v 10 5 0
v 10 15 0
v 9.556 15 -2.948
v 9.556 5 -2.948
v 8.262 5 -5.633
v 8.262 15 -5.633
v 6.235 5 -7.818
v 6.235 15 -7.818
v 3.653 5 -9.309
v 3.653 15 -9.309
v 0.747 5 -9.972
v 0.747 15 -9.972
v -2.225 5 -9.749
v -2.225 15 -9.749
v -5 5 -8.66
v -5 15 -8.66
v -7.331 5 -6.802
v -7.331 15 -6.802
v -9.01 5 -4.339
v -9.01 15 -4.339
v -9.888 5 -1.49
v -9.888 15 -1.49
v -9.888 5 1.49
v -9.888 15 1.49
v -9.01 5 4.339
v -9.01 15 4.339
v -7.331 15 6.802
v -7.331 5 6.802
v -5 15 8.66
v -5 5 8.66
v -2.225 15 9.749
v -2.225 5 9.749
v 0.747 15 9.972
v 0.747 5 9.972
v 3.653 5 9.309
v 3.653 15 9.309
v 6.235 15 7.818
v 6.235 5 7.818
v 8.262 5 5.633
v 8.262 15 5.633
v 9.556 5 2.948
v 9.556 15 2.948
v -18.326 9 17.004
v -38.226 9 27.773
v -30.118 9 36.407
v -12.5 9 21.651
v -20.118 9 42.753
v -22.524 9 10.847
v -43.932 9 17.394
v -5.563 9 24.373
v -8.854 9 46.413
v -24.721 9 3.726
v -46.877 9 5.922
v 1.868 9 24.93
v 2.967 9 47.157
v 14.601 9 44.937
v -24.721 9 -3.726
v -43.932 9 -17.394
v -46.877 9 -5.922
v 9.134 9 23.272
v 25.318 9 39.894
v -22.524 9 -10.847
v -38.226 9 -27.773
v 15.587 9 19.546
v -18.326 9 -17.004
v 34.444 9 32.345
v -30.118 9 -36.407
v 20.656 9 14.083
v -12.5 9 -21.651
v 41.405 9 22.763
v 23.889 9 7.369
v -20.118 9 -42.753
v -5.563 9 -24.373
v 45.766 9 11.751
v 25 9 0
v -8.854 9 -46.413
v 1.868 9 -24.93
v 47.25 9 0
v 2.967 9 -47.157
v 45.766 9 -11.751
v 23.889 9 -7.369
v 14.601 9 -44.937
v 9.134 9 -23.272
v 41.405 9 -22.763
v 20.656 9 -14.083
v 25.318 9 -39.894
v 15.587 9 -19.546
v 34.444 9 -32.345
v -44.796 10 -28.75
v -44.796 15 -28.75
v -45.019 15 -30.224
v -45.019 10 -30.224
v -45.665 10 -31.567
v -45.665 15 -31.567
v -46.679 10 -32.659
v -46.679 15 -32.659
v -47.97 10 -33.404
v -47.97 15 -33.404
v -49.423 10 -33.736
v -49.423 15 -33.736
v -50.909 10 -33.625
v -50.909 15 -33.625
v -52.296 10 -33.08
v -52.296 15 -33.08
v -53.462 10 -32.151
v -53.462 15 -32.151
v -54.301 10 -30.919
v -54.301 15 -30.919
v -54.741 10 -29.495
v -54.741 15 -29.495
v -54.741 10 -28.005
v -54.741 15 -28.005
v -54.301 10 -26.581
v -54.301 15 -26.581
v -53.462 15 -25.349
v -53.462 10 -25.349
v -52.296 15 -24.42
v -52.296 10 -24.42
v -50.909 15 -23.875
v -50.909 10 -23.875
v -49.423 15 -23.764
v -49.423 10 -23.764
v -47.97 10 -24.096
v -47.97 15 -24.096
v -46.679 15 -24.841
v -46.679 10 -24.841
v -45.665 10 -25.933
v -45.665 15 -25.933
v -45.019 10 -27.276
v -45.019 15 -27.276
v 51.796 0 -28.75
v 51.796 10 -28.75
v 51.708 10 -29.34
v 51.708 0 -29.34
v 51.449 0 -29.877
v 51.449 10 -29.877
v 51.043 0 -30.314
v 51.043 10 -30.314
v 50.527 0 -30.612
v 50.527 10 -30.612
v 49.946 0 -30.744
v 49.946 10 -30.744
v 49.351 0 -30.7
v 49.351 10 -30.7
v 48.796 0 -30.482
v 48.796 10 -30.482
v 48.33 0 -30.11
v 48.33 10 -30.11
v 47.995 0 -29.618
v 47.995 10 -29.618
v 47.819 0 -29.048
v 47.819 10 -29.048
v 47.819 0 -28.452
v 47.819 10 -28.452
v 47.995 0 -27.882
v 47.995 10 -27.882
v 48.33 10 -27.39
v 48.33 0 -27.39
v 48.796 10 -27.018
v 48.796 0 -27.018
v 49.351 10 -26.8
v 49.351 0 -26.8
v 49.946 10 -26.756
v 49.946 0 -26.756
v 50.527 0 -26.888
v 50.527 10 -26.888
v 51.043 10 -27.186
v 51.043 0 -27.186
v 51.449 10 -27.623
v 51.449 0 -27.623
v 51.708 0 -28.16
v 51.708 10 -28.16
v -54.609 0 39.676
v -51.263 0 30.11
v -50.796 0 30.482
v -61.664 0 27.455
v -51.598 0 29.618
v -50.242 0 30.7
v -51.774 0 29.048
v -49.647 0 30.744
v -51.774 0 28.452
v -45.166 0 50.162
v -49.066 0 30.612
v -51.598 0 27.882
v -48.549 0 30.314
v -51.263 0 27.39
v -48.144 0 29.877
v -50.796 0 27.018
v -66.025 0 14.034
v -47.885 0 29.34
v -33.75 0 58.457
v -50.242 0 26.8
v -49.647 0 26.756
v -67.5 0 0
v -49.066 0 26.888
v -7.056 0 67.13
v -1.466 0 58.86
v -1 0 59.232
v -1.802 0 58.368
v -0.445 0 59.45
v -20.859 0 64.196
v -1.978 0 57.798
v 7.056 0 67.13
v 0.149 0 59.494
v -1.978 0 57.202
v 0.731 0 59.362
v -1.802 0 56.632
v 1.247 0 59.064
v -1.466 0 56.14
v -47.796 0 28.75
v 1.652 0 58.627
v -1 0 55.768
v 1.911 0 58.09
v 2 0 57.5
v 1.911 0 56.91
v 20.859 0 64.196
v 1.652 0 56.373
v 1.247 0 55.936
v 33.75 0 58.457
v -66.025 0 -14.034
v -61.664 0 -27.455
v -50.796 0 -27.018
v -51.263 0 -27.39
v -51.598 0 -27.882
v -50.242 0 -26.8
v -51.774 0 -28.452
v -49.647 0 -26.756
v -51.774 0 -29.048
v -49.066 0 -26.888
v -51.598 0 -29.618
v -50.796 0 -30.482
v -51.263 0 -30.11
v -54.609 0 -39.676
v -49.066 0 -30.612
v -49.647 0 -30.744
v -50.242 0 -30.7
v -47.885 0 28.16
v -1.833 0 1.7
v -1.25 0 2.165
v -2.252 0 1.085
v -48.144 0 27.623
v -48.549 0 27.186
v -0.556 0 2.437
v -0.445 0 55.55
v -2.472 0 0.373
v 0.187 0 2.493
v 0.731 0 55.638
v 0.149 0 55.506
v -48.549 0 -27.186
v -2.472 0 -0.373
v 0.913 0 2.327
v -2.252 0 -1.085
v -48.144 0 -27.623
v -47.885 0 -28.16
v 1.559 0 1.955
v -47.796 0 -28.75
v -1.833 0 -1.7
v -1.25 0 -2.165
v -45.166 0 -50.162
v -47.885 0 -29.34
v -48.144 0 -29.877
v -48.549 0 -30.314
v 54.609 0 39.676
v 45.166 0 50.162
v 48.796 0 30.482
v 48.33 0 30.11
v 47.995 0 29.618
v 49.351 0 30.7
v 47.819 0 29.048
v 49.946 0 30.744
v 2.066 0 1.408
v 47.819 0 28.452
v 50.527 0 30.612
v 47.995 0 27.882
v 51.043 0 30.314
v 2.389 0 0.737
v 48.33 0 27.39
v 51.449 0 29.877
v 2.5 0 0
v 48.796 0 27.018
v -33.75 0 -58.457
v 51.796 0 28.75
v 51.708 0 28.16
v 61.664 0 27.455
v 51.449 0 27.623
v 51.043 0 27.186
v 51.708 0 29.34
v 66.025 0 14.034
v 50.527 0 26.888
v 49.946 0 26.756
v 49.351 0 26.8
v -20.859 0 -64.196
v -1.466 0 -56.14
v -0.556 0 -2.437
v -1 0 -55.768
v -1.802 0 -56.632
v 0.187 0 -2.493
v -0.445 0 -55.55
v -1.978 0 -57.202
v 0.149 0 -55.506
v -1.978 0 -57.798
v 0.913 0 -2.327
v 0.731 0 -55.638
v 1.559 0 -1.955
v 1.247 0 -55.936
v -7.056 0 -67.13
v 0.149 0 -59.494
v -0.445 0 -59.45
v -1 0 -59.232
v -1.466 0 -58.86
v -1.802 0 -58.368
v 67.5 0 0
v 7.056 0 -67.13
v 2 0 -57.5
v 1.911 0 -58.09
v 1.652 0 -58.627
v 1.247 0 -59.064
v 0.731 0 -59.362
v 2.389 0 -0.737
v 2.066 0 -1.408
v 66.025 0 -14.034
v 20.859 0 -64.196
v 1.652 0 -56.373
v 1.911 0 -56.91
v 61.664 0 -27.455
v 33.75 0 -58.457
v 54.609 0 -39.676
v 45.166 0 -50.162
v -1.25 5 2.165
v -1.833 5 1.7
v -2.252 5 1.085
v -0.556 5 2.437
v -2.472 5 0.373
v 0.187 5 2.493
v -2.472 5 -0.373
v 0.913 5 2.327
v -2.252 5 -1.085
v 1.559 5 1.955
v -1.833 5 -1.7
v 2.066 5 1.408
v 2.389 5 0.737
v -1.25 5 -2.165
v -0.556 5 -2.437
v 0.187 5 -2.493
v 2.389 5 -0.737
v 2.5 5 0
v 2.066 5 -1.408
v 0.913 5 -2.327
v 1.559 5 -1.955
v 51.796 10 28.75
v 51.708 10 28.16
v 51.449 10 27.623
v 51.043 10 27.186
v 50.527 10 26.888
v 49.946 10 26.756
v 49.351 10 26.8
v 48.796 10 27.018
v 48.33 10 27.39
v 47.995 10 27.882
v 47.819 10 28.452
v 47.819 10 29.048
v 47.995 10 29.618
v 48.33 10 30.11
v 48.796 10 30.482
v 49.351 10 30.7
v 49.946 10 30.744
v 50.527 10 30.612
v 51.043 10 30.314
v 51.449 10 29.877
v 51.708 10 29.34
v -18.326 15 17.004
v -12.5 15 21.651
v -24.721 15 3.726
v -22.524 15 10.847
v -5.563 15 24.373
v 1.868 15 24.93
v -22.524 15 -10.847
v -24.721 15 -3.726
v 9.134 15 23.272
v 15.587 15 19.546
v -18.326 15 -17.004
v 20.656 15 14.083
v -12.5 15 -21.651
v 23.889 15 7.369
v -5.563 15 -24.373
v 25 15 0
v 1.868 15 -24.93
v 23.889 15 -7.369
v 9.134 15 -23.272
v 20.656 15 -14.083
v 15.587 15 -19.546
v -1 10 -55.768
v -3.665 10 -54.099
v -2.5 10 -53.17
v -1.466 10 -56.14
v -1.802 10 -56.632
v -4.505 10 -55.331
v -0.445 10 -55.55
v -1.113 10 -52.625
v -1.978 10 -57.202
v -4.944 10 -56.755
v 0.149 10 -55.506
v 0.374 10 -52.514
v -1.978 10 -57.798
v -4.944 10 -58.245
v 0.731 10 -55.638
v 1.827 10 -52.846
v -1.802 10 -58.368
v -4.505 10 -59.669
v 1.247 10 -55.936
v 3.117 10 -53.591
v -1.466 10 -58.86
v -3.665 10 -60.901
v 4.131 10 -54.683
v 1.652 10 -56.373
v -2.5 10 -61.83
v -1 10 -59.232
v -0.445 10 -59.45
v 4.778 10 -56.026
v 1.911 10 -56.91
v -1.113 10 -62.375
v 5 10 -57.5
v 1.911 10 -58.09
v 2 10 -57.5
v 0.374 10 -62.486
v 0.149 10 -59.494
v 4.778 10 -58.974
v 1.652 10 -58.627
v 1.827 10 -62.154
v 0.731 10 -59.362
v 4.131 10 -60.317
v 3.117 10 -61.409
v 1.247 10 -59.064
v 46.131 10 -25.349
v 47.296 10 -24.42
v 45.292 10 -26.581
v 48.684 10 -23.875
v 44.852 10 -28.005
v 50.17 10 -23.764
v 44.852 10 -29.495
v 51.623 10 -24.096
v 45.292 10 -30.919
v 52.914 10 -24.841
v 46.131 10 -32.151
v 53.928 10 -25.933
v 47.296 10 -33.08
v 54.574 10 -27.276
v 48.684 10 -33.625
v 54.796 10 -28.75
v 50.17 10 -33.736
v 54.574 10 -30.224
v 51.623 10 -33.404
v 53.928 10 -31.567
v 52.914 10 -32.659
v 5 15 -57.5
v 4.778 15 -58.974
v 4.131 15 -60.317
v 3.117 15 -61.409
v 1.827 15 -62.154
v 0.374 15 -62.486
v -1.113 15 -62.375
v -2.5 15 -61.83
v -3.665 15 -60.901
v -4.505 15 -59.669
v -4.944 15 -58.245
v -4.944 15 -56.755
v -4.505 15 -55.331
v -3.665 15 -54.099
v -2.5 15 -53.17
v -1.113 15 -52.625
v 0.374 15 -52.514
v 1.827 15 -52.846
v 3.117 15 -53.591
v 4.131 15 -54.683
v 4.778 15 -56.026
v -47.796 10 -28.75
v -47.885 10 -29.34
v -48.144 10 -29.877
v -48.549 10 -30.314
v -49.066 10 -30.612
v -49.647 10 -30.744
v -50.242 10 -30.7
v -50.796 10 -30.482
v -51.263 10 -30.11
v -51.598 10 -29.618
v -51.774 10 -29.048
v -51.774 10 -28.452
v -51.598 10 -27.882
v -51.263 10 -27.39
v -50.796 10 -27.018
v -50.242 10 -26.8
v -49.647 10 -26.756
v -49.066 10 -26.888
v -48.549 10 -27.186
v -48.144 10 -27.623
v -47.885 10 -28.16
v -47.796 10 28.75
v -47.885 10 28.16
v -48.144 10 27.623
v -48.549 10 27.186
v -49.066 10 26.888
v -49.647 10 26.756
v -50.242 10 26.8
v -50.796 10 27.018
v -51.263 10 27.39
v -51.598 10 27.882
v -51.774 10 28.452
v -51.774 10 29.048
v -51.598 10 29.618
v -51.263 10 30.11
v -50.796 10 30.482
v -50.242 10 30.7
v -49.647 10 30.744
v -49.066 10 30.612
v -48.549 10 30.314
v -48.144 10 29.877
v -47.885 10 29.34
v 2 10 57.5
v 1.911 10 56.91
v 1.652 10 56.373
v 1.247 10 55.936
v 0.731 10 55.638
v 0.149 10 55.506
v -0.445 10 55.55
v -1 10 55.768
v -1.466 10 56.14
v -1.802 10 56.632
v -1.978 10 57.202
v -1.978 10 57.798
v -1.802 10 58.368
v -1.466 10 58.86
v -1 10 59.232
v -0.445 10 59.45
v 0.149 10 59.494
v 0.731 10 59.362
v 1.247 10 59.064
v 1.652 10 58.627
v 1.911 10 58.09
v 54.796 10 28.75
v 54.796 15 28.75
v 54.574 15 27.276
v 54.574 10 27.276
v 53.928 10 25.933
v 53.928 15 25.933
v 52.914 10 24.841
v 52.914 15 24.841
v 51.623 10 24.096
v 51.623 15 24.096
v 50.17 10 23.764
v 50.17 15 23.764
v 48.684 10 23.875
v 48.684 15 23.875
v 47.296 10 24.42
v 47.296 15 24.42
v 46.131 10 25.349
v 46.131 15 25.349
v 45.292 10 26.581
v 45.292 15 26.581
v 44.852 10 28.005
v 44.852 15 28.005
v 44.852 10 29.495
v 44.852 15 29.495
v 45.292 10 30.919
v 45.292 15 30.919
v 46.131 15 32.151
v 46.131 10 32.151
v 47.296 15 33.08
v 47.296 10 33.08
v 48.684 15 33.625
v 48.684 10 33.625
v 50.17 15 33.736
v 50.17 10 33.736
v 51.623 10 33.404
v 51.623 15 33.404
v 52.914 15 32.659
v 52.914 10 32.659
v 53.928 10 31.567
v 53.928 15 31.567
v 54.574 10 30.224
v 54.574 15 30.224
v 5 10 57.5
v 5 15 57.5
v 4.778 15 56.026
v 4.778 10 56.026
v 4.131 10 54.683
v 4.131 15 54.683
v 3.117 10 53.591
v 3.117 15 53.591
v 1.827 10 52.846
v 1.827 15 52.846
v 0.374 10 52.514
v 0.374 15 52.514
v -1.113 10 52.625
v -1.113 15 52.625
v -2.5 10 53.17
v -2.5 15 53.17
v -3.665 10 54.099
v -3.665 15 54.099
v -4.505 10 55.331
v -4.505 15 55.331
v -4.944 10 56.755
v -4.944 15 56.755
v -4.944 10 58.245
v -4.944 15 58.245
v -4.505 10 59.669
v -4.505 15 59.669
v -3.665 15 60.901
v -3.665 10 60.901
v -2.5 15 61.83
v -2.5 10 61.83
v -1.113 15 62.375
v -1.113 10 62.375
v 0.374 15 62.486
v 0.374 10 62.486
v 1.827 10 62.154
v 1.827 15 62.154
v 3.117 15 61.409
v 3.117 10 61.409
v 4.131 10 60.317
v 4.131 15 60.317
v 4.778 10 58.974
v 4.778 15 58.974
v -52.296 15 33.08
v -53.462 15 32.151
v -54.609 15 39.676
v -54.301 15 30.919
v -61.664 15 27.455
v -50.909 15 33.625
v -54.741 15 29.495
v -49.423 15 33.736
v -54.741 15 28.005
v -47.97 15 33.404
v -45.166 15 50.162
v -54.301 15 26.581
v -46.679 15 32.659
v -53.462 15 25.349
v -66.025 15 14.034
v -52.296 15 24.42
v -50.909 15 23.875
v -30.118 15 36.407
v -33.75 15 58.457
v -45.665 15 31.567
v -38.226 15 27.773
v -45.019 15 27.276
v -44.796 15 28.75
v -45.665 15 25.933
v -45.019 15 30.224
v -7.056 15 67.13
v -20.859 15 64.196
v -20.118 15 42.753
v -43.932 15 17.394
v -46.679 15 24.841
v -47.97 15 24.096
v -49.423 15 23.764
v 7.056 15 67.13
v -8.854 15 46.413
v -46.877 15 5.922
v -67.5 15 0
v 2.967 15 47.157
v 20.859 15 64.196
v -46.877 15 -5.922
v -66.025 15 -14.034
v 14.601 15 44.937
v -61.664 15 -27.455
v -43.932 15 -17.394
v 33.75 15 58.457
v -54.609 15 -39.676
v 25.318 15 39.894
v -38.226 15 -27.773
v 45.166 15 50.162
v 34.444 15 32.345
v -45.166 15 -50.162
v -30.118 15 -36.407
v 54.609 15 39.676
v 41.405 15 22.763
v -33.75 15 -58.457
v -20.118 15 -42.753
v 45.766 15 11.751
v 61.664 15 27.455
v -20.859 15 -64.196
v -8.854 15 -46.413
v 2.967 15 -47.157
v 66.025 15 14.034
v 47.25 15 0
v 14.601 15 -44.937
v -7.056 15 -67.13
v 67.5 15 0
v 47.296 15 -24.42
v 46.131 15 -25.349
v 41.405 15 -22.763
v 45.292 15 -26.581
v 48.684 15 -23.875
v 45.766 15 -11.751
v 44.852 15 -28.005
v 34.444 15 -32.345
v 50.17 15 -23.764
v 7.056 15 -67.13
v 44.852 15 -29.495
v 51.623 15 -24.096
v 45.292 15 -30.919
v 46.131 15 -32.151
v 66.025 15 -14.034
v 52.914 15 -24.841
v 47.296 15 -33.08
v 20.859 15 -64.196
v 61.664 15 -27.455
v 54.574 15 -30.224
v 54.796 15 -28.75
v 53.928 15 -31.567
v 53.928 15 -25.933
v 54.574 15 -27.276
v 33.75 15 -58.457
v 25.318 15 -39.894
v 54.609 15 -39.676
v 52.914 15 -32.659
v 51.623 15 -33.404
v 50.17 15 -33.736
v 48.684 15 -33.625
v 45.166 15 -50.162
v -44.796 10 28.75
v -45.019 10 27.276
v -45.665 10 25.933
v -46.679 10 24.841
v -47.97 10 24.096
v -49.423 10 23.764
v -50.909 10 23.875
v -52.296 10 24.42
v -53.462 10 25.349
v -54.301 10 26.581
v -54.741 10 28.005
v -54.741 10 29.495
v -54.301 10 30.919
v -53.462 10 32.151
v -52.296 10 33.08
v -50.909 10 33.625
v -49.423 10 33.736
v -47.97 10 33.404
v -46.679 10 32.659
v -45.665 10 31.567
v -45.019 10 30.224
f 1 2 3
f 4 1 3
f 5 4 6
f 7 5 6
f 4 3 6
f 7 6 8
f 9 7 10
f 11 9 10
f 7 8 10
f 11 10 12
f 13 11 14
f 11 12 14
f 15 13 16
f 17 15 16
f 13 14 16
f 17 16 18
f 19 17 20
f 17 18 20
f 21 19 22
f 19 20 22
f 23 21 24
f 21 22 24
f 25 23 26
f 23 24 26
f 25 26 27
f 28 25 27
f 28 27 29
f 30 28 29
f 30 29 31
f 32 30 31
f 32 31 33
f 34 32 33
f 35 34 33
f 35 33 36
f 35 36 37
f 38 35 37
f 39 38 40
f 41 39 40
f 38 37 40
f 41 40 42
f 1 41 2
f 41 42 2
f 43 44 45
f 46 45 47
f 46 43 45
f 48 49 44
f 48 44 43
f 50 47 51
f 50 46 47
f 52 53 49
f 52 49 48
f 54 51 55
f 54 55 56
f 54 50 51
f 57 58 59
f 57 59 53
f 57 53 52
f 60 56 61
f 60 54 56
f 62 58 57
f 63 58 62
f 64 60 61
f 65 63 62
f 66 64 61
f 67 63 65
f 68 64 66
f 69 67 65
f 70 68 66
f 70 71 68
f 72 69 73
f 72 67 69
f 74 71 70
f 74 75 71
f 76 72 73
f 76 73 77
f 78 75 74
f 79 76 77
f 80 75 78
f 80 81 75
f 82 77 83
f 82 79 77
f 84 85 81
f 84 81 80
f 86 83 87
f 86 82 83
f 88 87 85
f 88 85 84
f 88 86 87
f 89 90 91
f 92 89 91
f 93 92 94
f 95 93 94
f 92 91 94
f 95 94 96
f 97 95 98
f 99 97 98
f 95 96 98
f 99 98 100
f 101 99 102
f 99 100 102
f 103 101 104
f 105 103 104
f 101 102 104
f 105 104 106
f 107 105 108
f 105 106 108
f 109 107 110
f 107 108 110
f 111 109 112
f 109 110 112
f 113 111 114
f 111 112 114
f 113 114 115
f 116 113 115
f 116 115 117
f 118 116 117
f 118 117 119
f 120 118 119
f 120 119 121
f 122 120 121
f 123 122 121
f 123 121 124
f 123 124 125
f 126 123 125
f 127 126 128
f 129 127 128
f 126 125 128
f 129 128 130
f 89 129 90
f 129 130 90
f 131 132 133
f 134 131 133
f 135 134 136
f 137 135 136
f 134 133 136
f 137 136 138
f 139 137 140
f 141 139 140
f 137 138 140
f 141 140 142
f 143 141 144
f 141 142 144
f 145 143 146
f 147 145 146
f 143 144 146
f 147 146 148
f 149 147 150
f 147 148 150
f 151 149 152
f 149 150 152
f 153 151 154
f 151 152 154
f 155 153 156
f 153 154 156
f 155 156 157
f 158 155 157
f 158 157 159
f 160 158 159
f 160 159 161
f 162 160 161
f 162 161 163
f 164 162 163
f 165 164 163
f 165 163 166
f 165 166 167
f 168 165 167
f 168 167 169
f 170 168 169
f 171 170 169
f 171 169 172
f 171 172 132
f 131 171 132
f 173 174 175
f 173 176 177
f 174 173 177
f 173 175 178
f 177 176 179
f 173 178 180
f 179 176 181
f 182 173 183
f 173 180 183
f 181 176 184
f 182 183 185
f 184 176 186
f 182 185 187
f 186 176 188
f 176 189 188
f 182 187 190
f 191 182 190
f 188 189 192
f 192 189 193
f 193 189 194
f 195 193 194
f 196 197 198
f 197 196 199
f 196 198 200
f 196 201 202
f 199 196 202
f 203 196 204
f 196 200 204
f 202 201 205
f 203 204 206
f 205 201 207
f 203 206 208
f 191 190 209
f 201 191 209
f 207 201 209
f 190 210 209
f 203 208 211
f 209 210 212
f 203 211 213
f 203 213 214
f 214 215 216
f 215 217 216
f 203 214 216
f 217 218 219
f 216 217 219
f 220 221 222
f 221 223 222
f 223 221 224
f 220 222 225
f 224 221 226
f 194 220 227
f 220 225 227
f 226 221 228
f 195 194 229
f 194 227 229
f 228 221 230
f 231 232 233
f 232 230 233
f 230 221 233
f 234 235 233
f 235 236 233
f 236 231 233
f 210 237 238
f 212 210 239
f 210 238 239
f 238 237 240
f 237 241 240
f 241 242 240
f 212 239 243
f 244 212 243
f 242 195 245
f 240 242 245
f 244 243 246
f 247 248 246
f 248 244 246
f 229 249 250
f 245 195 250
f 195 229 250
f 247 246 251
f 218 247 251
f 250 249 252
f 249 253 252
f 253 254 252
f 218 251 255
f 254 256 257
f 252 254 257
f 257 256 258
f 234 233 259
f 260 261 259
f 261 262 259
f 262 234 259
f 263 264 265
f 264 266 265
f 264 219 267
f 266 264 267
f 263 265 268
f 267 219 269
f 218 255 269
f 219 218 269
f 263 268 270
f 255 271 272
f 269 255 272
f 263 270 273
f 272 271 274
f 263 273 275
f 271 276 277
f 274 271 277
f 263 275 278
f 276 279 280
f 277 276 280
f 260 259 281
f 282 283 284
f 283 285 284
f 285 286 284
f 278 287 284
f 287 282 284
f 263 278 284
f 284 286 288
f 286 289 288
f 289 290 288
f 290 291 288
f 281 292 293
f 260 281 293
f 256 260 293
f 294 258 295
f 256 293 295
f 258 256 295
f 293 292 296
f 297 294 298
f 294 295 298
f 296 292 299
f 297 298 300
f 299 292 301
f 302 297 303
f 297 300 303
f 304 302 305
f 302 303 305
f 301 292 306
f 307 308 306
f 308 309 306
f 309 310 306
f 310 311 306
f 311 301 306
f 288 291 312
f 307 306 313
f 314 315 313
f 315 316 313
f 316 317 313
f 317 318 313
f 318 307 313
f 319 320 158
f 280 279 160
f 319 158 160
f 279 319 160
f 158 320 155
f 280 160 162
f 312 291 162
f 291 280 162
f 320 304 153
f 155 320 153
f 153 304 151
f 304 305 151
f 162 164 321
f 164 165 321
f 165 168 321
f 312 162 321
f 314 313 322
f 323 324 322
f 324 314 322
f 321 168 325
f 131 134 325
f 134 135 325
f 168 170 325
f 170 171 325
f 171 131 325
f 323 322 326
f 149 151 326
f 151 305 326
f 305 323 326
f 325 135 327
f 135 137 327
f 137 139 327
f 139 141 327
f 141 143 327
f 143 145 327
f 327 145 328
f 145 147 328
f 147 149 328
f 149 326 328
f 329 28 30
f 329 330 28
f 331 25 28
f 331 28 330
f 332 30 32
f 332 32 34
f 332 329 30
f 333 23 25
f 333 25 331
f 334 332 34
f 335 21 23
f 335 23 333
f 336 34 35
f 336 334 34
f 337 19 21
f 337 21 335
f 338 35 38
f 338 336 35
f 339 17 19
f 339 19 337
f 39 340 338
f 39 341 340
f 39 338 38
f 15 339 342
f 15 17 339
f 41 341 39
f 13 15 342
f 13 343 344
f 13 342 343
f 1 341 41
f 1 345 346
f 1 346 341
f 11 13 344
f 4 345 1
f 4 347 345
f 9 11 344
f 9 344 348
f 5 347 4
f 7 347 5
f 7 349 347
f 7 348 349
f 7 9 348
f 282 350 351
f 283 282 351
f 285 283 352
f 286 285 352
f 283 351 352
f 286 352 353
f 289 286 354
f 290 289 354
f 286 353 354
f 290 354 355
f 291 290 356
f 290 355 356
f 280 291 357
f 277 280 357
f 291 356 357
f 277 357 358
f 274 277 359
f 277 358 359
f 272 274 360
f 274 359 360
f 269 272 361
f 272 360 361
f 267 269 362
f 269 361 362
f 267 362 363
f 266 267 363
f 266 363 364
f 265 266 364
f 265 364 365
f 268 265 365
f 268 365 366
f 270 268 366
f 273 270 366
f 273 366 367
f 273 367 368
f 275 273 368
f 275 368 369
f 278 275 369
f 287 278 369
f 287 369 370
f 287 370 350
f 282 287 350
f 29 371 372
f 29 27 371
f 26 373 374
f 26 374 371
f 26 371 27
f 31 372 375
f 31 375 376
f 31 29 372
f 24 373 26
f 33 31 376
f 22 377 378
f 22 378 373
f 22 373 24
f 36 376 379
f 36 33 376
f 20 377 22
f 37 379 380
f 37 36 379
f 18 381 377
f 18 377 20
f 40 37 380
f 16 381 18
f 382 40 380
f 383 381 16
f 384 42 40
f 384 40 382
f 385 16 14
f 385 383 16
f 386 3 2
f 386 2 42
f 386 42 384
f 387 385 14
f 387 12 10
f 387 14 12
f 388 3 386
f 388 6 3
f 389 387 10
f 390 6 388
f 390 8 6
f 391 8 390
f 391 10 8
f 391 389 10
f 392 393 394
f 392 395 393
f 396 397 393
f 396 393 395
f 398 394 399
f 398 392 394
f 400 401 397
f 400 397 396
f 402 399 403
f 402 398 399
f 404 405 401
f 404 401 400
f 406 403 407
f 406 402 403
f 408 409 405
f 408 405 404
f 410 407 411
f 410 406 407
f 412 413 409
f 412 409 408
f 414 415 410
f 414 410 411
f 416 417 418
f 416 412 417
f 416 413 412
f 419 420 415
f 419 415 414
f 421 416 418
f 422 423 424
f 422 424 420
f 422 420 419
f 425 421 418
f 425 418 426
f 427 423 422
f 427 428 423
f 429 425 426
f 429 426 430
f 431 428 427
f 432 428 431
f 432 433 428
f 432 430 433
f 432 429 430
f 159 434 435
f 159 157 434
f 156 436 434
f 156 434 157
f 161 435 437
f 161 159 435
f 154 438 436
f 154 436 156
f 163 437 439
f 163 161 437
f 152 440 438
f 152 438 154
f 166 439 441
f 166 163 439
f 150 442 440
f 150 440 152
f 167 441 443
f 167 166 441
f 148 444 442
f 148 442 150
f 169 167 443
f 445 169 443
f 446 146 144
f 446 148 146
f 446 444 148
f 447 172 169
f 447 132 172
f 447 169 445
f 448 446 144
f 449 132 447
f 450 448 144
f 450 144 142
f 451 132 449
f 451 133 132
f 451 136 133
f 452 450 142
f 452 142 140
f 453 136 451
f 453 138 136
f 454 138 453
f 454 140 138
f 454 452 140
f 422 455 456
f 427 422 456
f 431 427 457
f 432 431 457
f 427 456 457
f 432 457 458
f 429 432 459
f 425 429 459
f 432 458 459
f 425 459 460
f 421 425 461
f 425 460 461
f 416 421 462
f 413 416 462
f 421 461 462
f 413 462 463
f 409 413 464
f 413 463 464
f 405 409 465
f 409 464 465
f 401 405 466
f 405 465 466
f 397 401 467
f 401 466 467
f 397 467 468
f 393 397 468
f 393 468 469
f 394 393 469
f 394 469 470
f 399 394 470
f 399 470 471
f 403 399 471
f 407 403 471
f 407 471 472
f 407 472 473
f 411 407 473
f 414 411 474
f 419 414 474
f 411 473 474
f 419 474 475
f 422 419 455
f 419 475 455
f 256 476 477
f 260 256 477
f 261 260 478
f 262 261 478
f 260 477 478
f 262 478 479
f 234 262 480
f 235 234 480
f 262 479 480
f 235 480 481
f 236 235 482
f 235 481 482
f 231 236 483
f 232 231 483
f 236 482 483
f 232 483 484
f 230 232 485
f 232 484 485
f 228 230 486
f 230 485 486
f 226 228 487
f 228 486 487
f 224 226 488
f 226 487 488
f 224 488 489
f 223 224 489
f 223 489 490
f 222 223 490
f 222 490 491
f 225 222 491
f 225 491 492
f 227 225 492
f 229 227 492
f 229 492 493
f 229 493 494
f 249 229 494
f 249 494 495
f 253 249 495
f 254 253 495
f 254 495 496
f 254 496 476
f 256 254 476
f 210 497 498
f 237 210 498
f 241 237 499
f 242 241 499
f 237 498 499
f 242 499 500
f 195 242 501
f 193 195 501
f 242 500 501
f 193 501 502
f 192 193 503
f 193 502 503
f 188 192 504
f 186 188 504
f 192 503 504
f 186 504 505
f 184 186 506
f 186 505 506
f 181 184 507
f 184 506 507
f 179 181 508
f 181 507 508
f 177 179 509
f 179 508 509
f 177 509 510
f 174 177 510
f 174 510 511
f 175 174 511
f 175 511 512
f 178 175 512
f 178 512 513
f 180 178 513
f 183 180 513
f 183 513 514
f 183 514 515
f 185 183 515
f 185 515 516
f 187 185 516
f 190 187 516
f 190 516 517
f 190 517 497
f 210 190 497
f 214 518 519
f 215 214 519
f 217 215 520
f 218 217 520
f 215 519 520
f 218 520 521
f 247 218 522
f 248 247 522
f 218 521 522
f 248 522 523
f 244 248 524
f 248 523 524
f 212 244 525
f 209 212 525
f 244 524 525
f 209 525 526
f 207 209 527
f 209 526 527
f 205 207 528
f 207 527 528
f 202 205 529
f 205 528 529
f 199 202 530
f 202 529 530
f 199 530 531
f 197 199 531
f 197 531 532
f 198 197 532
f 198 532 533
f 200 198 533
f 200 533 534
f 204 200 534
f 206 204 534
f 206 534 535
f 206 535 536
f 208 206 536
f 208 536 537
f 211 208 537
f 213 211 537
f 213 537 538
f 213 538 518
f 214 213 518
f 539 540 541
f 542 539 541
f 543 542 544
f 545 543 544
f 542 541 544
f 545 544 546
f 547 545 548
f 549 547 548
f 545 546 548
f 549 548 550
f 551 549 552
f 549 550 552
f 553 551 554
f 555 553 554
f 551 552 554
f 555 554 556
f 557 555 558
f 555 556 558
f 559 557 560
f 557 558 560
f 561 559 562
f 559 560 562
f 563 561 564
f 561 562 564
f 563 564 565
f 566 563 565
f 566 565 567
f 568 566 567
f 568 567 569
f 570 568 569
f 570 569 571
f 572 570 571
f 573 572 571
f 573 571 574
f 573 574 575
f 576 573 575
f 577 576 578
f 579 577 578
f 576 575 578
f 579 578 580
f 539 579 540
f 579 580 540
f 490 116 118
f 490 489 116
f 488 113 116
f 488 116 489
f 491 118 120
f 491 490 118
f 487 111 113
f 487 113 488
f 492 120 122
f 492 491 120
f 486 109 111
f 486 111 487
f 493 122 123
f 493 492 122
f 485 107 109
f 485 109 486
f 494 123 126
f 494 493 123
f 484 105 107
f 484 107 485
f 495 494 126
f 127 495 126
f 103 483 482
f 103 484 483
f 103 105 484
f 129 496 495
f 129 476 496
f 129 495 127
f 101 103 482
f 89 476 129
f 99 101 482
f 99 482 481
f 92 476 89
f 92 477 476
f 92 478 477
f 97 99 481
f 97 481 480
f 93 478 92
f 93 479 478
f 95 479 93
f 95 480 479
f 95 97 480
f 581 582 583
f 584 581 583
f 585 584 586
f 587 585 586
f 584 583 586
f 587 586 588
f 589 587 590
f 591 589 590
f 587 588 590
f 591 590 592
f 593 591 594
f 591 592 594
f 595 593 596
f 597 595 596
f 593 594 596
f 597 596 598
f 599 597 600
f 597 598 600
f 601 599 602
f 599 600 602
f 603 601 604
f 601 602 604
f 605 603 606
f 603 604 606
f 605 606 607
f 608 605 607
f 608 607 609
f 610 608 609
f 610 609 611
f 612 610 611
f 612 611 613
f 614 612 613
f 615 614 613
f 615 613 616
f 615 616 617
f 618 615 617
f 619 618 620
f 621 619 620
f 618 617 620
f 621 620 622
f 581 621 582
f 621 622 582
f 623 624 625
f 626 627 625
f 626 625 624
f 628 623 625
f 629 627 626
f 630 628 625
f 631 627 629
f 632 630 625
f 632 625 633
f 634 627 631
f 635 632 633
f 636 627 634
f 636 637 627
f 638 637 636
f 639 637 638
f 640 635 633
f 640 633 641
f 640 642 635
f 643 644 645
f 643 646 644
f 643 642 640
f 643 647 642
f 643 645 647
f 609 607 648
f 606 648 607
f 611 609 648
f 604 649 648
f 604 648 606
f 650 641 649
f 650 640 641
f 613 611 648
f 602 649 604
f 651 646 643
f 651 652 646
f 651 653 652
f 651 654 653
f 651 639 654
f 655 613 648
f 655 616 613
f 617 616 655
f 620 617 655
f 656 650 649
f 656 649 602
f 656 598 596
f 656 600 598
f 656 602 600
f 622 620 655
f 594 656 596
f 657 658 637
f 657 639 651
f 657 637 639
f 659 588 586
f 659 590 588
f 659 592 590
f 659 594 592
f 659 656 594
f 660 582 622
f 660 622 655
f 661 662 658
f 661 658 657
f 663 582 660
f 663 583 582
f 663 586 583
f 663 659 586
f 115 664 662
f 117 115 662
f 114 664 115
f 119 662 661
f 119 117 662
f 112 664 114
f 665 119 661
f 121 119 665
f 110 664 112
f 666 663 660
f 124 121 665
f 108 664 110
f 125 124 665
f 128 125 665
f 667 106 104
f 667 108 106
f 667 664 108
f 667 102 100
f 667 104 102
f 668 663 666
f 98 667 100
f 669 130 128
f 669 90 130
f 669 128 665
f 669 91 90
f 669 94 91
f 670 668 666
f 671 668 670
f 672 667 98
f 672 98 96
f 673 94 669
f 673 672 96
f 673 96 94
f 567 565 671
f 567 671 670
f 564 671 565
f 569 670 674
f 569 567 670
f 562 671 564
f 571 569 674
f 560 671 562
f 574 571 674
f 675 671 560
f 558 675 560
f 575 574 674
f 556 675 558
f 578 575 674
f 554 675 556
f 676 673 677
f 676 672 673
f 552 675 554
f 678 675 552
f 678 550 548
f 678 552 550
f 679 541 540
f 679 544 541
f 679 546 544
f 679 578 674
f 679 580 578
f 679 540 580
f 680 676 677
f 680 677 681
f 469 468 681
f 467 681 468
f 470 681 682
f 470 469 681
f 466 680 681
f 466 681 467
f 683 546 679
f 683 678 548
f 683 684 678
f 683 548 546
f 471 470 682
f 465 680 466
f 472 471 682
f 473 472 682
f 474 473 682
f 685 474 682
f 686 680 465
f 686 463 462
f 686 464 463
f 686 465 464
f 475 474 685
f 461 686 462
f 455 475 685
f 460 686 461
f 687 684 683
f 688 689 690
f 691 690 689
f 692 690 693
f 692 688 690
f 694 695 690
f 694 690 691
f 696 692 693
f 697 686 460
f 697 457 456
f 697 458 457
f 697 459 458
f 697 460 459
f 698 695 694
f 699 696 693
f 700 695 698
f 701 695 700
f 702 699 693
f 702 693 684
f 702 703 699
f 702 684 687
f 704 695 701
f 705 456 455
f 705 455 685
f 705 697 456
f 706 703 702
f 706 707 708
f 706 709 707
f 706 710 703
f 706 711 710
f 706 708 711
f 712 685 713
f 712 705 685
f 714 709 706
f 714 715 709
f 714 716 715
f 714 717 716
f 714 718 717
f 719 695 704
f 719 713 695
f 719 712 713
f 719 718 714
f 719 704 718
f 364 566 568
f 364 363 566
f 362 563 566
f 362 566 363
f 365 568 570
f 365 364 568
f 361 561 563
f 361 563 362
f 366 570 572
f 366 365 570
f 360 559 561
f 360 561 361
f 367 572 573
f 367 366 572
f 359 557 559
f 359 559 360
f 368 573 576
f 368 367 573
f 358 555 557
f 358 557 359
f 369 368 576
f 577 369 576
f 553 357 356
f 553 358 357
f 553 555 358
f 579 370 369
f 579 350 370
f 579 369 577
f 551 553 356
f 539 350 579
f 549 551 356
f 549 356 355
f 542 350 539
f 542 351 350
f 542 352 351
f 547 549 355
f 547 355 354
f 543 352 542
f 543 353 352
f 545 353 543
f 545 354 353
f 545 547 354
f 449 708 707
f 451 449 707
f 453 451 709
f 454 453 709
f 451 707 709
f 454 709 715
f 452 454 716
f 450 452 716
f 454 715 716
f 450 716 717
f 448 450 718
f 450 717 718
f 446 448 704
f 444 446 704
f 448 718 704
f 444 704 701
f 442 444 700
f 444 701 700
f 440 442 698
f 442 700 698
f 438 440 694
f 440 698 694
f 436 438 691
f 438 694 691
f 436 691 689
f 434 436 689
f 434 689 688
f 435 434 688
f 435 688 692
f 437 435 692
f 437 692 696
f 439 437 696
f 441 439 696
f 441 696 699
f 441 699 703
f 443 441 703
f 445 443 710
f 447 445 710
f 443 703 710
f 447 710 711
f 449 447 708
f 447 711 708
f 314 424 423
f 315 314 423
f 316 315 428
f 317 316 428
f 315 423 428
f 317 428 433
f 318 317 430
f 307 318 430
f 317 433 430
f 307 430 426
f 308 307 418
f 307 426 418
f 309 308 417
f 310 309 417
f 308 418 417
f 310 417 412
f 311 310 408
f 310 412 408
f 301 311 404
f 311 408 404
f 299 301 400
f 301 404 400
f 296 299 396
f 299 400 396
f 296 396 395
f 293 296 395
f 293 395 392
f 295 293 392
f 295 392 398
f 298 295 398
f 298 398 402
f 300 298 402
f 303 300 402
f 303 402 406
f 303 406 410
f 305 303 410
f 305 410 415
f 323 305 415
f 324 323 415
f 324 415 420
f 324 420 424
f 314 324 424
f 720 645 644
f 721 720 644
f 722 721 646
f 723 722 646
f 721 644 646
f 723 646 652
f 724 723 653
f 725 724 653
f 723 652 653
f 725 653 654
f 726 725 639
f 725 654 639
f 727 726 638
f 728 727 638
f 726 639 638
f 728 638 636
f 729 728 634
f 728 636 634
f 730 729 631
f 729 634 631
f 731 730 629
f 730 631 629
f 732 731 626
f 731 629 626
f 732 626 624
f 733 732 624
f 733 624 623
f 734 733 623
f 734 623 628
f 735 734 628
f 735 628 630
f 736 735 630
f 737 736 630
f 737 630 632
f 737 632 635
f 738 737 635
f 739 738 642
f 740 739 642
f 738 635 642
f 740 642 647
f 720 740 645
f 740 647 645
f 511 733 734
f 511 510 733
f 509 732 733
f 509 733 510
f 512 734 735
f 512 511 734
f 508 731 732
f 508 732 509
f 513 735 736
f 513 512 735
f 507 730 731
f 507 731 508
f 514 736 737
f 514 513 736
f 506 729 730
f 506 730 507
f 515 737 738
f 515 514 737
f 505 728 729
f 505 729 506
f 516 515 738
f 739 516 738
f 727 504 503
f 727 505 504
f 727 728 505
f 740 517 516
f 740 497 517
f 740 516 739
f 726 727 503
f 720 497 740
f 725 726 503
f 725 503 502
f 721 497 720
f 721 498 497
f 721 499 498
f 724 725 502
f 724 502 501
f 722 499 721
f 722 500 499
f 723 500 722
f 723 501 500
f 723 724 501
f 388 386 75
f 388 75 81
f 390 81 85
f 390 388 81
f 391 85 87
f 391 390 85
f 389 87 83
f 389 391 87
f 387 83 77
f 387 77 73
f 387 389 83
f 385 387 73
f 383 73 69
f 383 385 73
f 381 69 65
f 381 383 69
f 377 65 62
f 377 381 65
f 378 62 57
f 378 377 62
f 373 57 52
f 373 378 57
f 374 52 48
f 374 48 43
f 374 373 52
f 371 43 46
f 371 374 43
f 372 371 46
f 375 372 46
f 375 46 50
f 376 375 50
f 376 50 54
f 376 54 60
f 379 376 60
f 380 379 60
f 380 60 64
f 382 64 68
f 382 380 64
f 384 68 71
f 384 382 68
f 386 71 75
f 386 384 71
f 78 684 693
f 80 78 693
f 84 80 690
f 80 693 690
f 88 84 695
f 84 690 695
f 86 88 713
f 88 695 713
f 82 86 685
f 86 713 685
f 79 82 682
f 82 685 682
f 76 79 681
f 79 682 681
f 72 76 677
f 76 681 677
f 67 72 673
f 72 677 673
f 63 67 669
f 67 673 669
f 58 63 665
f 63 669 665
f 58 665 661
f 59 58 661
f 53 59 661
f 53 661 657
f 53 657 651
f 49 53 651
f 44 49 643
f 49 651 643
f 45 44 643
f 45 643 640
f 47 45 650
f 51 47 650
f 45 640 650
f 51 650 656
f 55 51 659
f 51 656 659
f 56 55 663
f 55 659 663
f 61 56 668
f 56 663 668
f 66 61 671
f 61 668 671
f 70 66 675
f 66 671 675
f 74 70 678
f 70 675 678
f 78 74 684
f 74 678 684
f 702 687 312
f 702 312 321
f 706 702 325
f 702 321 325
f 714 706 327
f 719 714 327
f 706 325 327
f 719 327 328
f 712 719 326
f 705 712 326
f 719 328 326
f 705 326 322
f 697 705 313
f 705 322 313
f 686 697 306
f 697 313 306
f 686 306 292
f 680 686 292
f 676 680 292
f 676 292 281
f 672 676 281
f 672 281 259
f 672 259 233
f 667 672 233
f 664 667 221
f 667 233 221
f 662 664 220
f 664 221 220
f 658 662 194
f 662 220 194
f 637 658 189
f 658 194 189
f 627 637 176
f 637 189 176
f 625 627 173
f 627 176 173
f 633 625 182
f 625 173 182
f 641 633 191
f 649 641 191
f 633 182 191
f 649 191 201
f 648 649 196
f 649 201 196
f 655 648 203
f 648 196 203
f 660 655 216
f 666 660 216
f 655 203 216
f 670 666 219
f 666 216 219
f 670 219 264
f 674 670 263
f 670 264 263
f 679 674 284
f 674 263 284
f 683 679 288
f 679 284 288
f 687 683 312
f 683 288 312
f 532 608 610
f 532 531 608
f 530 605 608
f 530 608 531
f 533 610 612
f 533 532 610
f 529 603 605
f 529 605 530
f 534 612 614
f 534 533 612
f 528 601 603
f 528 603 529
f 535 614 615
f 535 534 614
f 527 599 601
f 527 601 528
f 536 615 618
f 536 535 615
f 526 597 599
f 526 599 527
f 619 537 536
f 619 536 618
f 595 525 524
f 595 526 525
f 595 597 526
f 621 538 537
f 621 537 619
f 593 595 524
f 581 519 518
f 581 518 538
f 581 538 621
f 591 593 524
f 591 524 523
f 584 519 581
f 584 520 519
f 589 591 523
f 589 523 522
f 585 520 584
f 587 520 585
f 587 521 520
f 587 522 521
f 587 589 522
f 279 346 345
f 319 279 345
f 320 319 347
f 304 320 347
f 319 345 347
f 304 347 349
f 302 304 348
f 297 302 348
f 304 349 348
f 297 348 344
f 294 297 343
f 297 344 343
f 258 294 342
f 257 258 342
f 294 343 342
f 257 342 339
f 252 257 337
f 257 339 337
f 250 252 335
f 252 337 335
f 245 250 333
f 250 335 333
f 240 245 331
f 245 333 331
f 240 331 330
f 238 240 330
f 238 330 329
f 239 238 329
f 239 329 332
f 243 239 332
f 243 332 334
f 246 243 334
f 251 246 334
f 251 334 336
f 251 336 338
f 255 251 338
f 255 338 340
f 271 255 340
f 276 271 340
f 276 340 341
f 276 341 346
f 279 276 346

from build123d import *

# Parameters (mm, degrees)
SKETCH1_R           = 67.5
BOSS_EXTRUDE1_DEPTH = 15
SKETCH2_R           = 47.25
SKETCH2_R_2         = 25
CUT_EXTRUDE1_DEPTH  = 6
SKETCH3_R           = 10
CUT_EXTRUDE2_DEPTH  = 10
SKETCH5_R           = 2.5
CUT_EXTRUDE3_DEPTH  = 10
SKETCH6_R           = 2
CUT_EXTRUDE4_DEPTH  = 15
SKETCH7_R           = 5
CUT_EXTRUDE5_DEPTH  = 5


with BuildPart() as part:
    # Sketch1 → Boss-Extrude1 (new body)
    with BuildSketch(Plane(origin=(0, 0, 0), x_dir=(1, 0, 0), z_dir=(0, 1, 0))):
        Circle(SKETCH1_R)
    extrude(amount=BOSS_EXTRUDE1_DEPTH)

    # Sketch2 → Cut-Extrude1 (cut)
    with BuildSketch(Plane(origin=(0, 15, 0), x_dir=(1, 0, 0), z_dir=(0, 1, 0))):
        Circle(SKETCH2_R)
        Circle(SKETCH2_R_2, mode=Mode.SUBTRACT)
    extrude(amount=-CUT_EXTRUDE1_DEPTH, mode=Mode.SUBTRACT)

    # Sketch3 → Cut-Extrude2 (cut)
    with BuildSketch(Plane(origin=(0, 15, 0), x_dir=(1, 0, 0), z_dir=(0, 1, 0))):
        Circle(SKETCH3_R)
    extrude(amount=-CUT_EXTRUDE2_DEPTH, mode=Mode.SUBTRACT)

    # Sketch5 → Cut-Extrude3 (cut)
    with BuildSketch(Plane(origin=(0, 5, 0), x_dir=(1, 0, 0), z_dir=(0, 1, 0))):
        Circle(SKETCH5_R)
    extrude(amount=-CUT_EXTRUDE3_DEPTH, mode=Mode.SUBTRACT)

    # Sketch6 → Cut-Extrude4 (cut)
    with BuildSketch(Plane(origin=(0, 15, 0), x_dir=(1, 0, 0), z_dir=(0, 1, 0))):
        with Locations((0, 57.5)):
            Circle(SKETCH6_R)
        with Locations((49.796460718, 28.75)):
            Circle(SKETCH6_R)
        with Locations((49.796460718, -28.75)):
            Circle(SKETCH6_R)
        with Locations((0, -57.5)):
            Circle(SKETCH6_R)
        with Locations((-49.796460718, -28.75)):
            Circle(SKETCH6_R)
        with Locations((-49.796460718, 28.75)):
            Circle(SKETCH6_R)
    extrude(amount=-CUT_EXTRUDE4_DEPTH, mode=Mode.SUBTRACT)

    # Sketch7 → Cut-Extrude5 (cut)
    with BuildSketch(Plane(origin=(0, 15, 0), x_dir=(1, 0, 0), z_dir=(0, 1, 0))):
        with Locations((0, 57.5)):
            Circle(SKETCH7_R)
        with Locations((49.796460718, 28.75)):
            Circle(SKETCH7_R)
        with Locations((49.796460718, -28.75)):
            Circle(SKETCH7_R)
        with Locations((0, -57.5)):
            Circle(SKETCH7_R)
        with Locations((-49.796460718, -28.75)):
            Circle(SKETCH7_R)
        with Locations((-49.796460718, 28.75)):
            Circle(SKETCH7_R)
    extrude(amount=-CUT_EXTRUDE5_DEPTH, mode=Mode.SUBTRACT)


solid = part.part
